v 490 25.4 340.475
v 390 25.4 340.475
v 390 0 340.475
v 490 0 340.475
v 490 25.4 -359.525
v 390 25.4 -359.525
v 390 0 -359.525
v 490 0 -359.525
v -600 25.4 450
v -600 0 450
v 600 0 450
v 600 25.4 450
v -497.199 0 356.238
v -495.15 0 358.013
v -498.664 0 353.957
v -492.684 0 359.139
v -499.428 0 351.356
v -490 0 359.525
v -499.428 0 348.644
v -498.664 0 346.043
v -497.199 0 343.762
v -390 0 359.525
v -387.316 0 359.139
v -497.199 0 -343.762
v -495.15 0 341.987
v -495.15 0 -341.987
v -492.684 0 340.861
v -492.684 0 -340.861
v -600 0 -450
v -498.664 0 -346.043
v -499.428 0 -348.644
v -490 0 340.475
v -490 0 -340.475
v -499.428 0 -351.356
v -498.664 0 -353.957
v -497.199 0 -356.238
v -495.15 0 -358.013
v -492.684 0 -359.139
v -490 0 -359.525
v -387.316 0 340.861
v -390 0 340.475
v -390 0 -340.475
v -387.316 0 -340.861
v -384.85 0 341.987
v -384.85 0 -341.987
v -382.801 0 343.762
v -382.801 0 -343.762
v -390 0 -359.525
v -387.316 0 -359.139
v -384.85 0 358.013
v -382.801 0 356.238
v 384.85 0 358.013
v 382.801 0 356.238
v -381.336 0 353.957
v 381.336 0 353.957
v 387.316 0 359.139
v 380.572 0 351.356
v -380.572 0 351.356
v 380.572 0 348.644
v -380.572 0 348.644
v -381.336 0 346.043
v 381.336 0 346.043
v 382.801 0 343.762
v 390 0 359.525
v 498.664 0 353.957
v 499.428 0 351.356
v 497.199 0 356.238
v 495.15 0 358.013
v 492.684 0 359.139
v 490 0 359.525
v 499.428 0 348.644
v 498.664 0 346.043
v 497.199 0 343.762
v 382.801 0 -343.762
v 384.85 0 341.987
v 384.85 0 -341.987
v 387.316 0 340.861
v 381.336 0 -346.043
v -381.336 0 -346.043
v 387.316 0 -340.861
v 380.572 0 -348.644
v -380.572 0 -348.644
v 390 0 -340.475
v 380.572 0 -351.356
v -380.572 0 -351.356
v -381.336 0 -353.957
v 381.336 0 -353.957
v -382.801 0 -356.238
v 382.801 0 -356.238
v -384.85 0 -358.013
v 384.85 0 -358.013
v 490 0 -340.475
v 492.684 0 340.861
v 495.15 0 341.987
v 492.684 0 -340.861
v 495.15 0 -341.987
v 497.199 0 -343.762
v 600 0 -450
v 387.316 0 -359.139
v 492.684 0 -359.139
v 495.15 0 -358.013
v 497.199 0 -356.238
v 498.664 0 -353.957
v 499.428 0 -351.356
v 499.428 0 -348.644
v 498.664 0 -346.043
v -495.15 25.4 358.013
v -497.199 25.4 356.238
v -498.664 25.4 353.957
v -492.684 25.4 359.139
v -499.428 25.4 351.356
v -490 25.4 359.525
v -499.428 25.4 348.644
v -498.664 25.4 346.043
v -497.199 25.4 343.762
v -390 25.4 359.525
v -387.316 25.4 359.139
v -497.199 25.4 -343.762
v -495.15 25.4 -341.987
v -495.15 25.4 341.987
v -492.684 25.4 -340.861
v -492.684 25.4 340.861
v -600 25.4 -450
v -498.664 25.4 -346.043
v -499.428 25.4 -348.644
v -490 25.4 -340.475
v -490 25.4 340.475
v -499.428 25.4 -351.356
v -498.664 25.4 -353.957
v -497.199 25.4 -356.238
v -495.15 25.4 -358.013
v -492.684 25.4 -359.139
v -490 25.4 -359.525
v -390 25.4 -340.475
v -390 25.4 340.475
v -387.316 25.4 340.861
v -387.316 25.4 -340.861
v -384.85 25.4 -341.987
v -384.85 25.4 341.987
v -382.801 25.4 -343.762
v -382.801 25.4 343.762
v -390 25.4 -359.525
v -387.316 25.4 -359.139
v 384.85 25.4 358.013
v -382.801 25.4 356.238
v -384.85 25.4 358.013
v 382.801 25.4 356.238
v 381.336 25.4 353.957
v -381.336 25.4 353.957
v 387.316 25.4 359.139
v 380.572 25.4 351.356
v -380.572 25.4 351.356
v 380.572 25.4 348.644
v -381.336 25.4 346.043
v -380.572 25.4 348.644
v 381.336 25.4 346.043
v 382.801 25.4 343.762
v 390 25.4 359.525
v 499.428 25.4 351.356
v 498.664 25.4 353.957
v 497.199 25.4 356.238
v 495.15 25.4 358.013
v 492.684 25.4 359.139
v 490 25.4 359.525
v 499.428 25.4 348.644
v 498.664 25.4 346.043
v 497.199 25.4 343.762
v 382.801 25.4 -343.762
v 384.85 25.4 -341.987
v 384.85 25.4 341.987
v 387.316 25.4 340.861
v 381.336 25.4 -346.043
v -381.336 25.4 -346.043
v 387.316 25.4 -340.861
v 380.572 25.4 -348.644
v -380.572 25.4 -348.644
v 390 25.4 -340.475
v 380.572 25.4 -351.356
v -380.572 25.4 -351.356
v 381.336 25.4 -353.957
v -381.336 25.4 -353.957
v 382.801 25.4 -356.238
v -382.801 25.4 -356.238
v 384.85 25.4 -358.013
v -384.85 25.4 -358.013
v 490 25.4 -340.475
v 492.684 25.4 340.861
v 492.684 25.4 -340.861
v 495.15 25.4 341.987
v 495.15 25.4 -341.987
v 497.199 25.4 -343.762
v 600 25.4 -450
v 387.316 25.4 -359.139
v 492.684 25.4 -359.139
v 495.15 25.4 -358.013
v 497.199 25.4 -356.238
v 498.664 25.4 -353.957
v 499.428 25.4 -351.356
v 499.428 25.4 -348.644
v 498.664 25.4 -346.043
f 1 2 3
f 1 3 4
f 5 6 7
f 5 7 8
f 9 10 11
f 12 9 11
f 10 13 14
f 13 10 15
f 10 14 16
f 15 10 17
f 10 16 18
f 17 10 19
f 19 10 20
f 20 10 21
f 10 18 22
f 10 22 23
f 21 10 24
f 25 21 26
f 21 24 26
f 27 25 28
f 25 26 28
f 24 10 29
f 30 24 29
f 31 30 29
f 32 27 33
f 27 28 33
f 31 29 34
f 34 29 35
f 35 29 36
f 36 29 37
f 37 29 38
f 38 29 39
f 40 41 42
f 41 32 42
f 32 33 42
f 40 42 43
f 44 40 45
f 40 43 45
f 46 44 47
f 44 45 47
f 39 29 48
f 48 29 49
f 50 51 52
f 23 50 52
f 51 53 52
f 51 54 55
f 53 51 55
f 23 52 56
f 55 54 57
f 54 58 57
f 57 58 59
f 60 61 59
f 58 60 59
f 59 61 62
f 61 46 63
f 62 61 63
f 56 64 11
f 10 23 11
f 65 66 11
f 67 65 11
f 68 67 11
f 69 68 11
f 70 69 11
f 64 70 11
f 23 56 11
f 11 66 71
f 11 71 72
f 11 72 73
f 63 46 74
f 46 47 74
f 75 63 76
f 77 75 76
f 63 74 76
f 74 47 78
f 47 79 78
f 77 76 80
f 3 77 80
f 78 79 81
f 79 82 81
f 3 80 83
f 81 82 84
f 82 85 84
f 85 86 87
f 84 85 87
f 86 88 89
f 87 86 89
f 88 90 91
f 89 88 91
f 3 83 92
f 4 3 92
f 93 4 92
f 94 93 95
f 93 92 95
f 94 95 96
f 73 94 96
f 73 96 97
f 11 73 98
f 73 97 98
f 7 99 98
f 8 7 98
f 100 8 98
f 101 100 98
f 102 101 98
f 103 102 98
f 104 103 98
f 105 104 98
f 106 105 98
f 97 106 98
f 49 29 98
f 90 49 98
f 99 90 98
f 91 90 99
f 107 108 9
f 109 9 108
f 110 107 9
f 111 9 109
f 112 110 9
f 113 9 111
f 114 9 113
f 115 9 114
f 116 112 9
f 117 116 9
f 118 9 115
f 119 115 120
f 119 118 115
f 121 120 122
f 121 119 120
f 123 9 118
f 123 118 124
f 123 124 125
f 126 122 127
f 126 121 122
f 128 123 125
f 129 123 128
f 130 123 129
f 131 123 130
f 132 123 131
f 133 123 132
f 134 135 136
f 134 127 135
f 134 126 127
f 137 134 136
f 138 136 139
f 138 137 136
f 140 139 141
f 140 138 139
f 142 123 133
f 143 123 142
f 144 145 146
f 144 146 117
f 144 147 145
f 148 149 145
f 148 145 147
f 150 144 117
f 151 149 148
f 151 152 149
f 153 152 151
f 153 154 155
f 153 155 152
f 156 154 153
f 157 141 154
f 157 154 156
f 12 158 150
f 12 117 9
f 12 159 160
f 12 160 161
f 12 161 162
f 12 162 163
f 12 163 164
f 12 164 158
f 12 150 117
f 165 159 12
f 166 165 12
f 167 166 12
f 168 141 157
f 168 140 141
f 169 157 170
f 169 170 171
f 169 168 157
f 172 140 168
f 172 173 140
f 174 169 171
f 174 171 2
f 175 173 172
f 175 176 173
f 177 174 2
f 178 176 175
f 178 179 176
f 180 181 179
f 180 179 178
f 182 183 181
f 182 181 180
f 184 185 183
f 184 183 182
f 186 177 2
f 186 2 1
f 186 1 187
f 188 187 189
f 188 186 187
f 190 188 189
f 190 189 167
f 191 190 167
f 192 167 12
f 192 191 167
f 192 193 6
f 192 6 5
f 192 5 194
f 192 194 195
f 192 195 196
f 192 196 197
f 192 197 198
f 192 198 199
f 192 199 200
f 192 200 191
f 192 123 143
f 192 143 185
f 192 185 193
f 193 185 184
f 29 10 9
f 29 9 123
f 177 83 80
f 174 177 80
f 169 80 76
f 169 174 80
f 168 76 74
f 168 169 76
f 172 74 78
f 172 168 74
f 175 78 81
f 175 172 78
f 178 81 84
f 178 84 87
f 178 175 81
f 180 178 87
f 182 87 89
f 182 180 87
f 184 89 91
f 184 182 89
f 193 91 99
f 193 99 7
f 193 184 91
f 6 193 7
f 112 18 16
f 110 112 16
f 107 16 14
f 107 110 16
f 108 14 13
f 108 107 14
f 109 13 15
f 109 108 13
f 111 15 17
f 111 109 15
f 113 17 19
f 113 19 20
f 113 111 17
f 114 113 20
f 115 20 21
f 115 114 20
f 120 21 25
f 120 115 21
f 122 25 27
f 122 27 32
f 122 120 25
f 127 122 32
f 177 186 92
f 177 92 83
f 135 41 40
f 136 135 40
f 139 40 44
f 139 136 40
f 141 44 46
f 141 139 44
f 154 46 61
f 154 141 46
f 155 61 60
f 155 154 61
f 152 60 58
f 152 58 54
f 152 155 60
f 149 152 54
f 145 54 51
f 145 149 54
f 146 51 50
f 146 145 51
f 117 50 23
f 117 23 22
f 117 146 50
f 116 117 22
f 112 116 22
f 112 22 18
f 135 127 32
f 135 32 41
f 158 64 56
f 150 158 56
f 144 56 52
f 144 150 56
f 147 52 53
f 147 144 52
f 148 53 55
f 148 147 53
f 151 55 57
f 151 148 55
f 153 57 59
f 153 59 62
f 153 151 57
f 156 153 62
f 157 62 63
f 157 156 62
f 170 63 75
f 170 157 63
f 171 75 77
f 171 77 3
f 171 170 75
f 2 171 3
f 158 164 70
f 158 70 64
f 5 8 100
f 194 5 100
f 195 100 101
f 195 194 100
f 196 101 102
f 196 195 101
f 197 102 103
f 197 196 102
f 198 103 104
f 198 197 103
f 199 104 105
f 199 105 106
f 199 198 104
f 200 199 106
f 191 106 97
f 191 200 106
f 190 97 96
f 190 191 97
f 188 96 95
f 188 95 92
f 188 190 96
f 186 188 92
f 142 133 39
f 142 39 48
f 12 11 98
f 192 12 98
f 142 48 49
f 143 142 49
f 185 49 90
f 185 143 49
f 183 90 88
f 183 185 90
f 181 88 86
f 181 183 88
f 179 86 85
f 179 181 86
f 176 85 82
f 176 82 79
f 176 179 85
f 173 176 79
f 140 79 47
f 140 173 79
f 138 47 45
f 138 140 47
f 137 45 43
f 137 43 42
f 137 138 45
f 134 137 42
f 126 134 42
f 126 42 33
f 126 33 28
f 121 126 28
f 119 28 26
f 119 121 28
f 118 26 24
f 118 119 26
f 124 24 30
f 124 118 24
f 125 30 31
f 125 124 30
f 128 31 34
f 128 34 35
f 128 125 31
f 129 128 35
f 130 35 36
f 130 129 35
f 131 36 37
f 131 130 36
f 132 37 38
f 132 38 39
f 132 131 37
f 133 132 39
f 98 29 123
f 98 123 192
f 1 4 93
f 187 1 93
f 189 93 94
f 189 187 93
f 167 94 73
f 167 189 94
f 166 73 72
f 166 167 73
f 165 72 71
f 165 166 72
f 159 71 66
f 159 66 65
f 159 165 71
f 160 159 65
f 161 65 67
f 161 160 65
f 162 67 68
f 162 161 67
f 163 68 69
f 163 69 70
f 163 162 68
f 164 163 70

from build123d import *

# Parameters (mm, degrees)
CROQUIS1_W              = 1200
CROQUIS1_H              = 900
SALIENTE_EXTRUIR1_DEPTH = 25.4
CORTAR_EXTRUIR1_DEPTH   = 25.4


with BuildPart() as part:
    # Croquis1 → Saliente-Extruir1 (new body)
    with BuildSketch(Plane(origin=(0, 0, 0), x_dir=(1, 0, 0), z_dir=(0, 1, 0))):
        Rectangle(CROQUIS1_W, CROQUIS1_H)
    extrude(amount=SALIENTE_EXTRUIR1_DEPTH)

    # Croquis2 → Cortar-Extruir1 (cut)
    with BuildSketch(Plane(origin=(0, 25.4, 0), x_dir=(1, 0, 0), z_dir=(0, 1, 0))):
        with BuildLine():
            Line((390, 359.525), (490, 359.525))
            ThreePointArc((490, 359.525), (499.525, 350), (490, 340.475))
            Line((490, 340.475), (390, 340.475))
            ThreePointArc((390, 340.475), (380.475, 350), (390, 359.525))
        make_face()
        with BuildLine():
            Line((-390, 340.475), (-490, 340.475))
            ThreePointArc((-490, 340.475), (-499.525, 350), (-490, 359.525))
            Line((-490, 359.525), (-390, 359.525))
            ThreePointArc((-390, 359.525), (-380.475, 350), (-390, 340.475))
        make_face()
        with BuildLine():
            Line((-390, -359.525), (-490, -359.525))
            ThreePointArc((-490, -359.525), (-499.525, -350), (-490, -340.475))
            Line((-490, -340.475), (-390, -340.475))
            ThreePointArc((-390, -340.475), (-380.475, -350), (-390, -359.525))
        make_face()
        with BuildLine():
            Line((390, -340.475), (490, -340.475))
            ThreePointArc((490, -340.475), (499.525, -350), (490, -359.525))
            Line((490, -359.525), (390, -359.525))
            ThreePointArc((390, -359.525), (380.475, -350), (390, -340.475))
        make_face()
    extrude(amount=-CORTAR_EXTRUIR1_DEPTH, mode=Mode.SUBTRACT)


solid = part.part
